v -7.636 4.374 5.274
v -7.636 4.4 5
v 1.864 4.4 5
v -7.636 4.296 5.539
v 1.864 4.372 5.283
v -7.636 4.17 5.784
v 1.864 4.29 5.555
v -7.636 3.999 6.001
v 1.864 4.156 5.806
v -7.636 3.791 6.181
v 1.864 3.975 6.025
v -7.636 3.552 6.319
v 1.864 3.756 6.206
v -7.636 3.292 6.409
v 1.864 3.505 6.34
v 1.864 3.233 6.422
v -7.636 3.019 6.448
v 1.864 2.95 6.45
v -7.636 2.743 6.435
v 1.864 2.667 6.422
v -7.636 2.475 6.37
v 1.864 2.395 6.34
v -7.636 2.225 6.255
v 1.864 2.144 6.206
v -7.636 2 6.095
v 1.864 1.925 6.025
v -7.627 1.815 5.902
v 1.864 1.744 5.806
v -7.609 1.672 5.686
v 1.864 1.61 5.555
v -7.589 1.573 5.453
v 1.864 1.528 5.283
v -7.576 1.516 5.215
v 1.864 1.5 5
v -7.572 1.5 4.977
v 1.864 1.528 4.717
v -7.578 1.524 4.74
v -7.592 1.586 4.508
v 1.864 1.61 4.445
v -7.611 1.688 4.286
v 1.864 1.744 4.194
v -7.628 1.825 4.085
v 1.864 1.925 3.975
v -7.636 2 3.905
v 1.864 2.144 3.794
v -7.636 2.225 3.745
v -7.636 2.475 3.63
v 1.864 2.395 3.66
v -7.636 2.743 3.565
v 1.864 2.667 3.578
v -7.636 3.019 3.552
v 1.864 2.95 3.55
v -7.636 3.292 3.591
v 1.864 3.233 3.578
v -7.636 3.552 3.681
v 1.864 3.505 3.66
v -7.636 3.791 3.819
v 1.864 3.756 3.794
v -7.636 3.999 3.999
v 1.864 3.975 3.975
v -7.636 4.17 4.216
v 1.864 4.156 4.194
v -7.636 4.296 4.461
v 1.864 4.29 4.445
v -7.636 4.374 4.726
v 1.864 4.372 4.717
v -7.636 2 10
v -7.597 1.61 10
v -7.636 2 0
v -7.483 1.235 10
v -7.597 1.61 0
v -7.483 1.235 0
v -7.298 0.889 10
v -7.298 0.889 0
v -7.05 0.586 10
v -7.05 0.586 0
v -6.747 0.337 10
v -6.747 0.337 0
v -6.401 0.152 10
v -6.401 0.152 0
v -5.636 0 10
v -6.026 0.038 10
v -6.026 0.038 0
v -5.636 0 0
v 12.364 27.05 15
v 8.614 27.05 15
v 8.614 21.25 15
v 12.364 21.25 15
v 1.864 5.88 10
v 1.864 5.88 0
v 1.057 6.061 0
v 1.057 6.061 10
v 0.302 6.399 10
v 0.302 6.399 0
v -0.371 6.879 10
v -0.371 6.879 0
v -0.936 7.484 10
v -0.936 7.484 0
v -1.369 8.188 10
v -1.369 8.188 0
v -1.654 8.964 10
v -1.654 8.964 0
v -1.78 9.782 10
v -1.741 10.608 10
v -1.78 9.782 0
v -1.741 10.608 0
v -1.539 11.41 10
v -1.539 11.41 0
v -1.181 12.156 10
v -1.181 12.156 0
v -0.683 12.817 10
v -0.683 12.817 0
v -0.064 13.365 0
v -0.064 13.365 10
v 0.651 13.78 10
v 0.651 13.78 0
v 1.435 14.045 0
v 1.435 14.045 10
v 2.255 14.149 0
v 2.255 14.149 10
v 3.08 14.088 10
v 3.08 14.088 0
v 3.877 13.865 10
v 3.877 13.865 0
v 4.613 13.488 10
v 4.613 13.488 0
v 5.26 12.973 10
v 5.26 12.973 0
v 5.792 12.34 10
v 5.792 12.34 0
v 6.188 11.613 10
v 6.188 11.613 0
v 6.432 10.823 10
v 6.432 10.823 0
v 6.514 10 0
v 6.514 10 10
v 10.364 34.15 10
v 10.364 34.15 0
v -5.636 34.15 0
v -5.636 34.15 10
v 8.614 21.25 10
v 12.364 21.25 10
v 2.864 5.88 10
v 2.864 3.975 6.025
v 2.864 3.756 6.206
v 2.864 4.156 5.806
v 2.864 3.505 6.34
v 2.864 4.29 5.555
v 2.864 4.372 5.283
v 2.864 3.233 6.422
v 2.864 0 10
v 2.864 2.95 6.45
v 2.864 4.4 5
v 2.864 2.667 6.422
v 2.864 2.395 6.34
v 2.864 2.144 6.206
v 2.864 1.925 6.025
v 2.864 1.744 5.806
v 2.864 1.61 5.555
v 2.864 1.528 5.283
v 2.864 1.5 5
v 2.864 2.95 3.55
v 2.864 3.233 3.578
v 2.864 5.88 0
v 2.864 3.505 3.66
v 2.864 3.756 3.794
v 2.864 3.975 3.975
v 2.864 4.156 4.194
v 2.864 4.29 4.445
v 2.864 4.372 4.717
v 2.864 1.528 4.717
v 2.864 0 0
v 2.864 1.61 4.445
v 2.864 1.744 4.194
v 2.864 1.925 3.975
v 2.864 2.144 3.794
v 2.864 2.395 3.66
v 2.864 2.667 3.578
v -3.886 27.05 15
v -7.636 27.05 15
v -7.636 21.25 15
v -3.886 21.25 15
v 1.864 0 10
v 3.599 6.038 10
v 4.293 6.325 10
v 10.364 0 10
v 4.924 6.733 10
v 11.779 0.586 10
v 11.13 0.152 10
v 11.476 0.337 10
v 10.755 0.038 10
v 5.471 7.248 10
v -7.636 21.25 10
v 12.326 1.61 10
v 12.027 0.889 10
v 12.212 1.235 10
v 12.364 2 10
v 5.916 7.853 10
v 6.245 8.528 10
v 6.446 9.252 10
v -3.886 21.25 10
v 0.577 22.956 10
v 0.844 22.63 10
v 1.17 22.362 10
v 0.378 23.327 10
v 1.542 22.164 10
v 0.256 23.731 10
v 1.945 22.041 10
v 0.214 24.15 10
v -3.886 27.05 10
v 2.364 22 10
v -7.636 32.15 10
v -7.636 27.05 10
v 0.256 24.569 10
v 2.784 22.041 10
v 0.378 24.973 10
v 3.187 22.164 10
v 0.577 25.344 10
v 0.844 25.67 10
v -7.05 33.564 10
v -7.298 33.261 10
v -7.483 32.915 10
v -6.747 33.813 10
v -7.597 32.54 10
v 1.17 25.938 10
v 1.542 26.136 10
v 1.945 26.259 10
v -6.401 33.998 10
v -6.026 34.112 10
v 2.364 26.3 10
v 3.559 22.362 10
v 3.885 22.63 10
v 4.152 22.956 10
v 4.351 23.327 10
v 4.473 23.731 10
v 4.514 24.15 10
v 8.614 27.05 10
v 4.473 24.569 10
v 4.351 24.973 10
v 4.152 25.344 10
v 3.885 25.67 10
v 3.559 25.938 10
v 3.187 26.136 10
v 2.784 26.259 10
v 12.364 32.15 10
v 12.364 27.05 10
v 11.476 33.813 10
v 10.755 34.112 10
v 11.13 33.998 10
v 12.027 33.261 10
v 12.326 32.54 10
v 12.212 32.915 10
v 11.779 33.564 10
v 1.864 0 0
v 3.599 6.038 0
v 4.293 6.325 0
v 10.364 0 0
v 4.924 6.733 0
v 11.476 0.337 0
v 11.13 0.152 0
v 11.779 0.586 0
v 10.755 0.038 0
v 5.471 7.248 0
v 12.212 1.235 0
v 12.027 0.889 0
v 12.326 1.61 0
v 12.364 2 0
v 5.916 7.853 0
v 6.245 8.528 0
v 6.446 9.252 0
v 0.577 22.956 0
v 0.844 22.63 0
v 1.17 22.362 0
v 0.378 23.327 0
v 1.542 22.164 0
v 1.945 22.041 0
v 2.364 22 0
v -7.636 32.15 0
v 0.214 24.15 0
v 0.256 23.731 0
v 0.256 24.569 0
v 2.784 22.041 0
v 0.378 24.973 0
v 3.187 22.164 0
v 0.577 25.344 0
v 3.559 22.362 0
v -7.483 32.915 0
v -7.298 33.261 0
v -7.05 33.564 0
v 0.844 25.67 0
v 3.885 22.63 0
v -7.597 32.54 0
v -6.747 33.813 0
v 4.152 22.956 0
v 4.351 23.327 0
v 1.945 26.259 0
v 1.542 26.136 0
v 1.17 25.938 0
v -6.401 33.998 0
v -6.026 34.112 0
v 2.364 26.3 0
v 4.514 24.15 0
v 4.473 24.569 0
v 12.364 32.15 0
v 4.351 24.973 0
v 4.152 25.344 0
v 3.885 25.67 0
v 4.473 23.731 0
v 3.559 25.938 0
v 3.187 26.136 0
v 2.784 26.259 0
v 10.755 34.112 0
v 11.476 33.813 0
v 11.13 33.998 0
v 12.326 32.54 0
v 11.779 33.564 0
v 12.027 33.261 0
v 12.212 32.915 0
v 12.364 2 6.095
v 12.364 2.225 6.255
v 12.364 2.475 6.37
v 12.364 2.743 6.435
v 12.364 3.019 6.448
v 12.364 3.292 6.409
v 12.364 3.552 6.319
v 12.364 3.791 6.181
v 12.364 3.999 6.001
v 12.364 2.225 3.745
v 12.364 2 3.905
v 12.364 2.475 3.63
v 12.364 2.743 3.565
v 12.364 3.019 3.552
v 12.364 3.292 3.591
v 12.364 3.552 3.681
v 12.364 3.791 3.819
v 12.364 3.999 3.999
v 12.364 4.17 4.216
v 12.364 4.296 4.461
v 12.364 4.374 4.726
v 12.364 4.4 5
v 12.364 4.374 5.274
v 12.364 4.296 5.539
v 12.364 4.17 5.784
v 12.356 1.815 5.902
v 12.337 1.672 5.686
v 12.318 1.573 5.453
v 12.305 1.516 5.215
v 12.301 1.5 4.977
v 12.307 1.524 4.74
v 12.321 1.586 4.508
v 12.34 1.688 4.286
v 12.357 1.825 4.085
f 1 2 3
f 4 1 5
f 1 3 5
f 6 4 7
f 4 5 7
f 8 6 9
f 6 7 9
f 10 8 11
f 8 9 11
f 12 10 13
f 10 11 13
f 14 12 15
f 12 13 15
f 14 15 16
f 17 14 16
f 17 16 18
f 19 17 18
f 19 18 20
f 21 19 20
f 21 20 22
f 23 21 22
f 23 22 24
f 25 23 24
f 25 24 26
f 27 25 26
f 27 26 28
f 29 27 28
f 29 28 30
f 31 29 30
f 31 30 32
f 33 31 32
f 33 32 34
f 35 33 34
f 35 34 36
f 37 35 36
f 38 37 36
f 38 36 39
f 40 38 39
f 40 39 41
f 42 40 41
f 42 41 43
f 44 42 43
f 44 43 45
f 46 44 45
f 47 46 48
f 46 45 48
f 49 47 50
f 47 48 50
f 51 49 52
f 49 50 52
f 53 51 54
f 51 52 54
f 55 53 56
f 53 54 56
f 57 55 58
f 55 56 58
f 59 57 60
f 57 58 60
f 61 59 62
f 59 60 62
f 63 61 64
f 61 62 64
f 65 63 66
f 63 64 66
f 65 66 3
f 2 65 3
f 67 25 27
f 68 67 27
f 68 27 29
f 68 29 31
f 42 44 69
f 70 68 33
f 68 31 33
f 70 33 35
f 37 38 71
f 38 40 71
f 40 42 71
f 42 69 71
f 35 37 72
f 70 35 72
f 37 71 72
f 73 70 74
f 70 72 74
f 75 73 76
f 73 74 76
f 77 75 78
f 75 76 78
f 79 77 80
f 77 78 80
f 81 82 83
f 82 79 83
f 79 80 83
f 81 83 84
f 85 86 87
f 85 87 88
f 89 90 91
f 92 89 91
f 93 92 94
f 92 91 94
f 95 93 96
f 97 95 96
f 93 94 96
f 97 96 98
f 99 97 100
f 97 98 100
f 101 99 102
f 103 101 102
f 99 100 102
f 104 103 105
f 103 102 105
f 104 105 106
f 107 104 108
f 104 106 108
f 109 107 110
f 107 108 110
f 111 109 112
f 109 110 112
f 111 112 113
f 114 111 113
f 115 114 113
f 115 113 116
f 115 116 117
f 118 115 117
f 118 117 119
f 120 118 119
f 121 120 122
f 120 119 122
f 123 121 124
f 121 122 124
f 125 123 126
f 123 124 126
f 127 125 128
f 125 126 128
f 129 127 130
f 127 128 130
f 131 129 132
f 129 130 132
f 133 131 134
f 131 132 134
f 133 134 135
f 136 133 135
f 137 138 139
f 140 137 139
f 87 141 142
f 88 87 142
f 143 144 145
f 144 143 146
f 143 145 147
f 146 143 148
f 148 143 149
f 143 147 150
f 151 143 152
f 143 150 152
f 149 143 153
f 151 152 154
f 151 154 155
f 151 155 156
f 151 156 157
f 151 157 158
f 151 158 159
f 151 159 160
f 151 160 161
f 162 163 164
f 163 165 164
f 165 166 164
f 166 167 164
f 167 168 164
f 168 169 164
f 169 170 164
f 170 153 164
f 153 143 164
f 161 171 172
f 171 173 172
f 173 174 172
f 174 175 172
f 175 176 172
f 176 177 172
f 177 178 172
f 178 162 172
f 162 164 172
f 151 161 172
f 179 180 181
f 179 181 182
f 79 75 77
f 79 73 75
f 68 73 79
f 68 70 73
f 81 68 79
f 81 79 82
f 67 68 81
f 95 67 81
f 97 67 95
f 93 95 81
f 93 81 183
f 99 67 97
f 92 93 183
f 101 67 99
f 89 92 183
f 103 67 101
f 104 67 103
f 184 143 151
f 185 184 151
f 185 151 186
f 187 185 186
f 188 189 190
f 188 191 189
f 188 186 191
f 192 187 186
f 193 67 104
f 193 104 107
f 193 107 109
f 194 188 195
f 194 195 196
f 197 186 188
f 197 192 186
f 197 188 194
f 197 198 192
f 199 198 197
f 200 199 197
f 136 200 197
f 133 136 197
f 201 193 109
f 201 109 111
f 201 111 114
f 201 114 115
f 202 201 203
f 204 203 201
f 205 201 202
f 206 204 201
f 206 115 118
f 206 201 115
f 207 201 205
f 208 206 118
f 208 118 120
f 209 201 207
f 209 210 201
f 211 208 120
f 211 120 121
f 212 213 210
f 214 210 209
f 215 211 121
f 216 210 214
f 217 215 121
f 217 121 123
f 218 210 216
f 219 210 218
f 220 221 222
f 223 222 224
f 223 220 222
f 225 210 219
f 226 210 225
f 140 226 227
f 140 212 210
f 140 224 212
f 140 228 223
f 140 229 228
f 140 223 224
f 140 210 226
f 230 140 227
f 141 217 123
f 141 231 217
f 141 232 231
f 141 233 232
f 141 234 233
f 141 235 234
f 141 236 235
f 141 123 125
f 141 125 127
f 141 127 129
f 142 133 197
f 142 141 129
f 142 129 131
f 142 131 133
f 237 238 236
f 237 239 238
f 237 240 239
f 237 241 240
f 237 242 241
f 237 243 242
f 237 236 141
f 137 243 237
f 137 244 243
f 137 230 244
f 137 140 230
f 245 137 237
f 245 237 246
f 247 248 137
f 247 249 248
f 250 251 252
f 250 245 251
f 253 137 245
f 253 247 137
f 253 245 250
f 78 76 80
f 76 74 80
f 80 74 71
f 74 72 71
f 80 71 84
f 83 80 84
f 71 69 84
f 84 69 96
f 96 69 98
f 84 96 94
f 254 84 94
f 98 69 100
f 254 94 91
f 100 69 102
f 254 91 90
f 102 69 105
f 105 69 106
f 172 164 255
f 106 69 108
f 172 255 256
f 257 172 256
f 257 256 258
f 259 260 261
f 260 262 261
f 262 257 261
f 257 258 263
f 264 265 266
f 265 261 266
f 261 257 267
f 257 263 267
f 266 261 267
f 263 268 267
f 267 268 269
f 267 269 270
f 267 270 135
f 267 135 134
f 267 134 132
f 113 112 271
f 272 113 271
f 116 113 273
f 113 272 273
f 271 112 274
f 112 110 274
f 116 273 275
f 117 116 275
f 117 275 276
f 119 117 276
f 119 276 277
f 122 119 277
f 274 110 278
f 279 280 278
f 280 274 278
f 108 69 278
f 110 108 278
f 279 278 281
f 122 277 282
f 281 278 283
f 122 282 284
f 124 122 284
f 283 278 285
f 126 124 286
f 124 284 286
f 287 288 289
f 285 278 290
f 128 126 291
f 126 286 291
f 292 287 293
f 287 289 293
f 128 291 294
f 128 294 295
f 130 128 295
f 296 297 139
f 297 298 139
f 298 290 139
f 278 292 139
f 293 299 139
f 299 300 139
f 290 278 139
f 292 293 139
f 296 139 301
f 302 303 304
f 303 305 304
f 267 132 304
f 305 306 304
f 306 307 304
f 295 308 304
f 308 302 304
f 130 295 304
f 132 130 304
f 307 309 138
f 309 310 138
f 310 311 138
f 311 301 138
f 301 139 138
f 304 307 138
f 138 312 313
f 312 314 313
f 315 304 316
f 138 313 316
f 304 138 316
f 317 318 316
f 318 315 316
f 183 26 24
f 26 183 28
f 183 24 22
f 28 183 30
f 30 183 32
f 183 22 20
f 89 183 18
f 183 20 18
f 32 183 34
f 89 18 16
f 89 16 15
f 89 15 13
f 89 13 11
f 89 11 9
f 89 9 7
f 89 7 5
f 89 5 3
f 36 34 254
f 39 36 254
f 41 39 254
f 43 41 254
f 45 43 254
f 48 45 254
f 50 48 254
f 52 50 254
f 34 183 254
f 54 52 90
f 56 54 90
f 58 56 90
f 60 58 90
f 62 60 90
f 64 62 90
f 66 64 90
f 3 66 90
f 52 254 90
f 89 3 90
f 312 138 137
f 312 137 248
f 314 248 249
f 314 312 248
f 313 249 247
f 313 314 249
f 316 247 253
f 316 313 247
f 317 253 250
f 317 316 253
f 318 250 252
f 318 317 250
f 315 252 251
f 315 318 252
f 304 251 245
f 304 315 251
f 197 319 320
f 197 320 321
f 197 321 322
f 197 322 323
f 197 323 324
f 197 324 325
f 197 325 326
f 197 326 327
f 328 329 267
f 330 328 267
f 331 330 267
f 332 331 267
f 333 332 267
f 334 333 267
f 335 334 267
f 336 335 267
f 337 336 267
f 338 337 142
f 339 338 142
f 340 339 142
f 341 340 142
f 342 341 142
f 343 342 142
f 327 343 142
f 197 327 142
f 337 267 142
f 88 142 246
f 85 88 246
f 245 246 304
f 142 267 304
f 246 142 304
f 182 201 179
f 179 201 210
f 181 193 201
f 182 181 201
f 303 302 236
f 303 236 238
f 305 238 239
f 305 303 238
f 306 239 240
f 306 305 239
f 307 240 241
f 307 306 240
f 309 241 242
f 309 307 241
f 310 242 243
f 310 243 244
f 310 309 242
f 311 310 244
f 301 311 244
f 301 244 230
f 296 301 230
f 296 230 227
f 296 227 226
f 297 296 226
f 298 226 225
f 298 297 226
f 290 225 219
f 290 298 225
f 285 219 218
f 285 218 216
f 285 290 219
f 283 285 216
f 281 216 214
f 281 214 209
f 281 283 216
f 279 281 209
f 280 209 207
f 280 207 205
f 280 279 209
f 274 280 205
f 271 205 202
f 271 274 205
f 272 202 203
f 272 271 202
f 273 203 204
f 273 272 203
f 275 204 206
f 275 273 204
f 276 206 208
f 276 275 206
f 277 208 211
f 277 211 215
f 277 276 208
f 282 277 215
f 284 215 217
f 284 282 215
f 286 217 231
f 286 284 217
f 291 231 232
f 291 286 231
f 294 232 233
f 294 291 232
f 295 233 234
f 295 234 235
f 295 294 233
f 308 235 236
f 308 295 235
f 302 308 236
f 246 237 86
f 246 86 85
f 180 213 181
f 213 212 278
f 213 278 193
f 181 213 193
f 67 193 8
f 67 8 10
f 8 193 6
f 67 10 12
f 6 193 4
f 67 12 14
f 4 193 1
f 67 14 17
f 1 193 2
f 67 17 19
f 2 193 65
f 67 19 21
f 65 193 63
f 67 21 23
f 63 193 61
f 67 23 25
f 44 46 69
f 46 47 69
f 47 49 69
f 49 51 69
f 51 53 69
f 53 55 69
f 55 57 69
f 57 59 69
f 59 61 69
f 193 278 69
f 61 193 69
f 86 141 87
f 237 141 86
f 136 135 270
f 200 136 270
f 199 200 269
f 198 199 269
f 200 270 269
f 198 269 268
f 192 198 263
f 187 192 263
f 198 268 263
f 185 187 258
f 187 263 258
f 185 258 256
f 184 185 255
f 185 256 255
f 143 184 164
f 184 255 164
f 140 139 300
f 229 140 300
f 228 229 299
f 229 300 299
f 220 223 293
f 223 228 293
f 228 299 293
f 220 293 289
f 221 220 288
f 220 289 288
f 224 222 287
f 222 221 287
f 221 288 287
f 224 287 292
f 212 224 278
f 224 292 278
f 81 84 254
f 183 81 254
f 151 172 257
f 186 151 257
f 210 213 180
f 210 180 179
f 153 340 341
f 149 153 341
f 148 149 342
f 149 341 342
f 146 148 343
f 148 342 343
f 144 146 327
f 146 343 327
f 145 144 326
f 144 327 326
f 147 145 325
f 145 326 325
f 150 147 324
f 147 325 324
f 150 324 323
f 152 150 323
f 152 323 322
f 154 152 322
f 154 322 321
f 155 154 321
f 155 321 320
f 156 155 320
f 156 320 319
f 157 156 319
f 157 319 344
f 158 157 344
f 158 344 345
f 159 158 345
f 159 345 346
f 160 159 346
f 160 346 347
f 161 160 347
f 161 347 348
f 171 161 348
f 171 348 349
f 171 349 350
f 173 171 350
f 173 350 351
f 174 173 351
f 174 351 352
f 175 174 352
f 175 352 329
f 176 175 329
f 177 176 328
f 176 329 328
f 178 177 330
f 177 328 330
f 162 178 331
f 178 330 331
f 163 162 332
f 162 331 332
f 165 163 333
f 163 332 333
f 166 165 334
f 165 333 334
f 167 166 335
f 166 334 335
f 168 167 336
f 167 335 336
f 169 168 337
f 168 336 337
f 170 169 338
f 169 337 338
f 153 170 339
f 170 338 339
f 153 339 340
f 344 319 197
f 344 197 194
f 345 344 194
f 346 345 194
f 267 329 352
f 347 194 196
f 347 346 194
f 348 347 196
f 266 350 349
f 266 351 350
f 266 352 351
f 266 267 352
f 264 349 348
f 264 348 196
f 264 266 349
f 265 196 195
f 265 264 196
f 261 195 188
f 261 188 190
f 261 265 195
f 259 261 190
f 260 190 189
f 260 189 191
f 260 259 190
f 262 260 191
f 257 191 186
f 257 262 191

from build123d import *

# Parameters (mm, degrees)
F0_R        = 2.15
F1_DEPTH    = 10
F2_W        = 3.75
F2_H        = 5.8
F3_DEPTH    = 5
F4_R        = 1.45
F5_DEPTH    = 25
F6_T1_DEPTH = 20


# Not quite as in the source:
# - a fillet or chamfer that OpenCascade refuses, or shapes differently, is made with other operations: its cross-section is extruded or revolved along the edge and cut away or added


with BuildPart() as f1:
    # F0 (on Top) → F1 (new body)
    with BuildSketch(Plane.XY):
        with BuildLine():
            Line((-7.6355537636, 34.15), (-7.6355537636, 0))
            Line((-7.6355537636, 0), (1.8644462364, 0))
            Line((1.8644462364, 0), (1.8644462364, 2.2661458509))
            ThreePointArc((1.8644462364, 2.2661458509), (-2.9359075253, 15.6540914389), (10.1144462364, 10))
            ThreePointArc((10.1144462364, 10), (8.0185376754, 4.6996462382), (2.8644462364, 2.2661458509))
            Line((2.8644462364, 2.2661458509), (2.8644462364, 0))
            Line((2.8644462364, 0), (12.3644462364, 0))
            Line((12.3644462364, 0), (12.3644462364, 34.15))
            Line((12.3644462364, 34.15), (-7.6355537636, 34.15))
        make_face()
        with Locations((2.3644462364, 24.15)):
            Circle(F0_R, mode=Mode.SUBTRACT)
        with BuildLine():
            ThreePointArc((10.1144462364, 10), (-2.9359075253, 15.6540914389), (1.8644462364, 2.2661458509))
            Line((1.8644462364, 2.2661458509), (1.8644462364, 5.880230589))
            ThreePointArc((1.8644462364, 5.880230589), (-0.387598458, 13.1062437123), (6.5144462364, 10))
            ThreePointArc((6.5144462364, 10), (5.4706899487, 7.2479553056), (2.8644462364, 5.880230589))
            Line((2.8644462364, 5.880230589), (2.8644462364, 2.2661458509))
            ThreePointArc((2.8644462364, 2.2661458509), (8.0185376754, 4.6996462382), (10.1144462364, 10))
        make_face()
    extrude(amount=F1_DEPTH)

    # F2 (on face) → F3 (join)
    with BuildSketch(Plane.XY.offset(10)):
        with Locations((-5.7605537636, 24.15)):
            Rectangle(F2_W, F2_H)
        with Locations((10.4894462364, 24.15)):
            Rectangle(F2_W, F2_H)
    extrude(amount=F3_DEPTH)

    # F4 (on face) → F5 (cut)
    with BuildSketch(Plane.YZ.offset(12.3644462364)):
        with Locations((2.95, 5)):
            Circle(F4_R)
    extrude(amount=-F5_DEPTH, mode=Mode.SUBTRACT)

    # F6: fillet of radius 2 on 4 edges, made by hand

    # F6_s2 → F6_t1 (cut)
    with BuildSketch(Plane.XY.offset(-5)):
        with BuildLine():
            ThreePointArc((12.3644462364, 2), (11.7786597988, 0.5857864376), (10.3644462364, 0))
            Line((10.3644462364, 0), (12.3644462364, 0))
            Line((12.3644462364, 0), (12.3644462364, 2))
        make_face()
        with BuildLine():
            ThreePointArc((-7.6355537636, 2), (-7.0497673259, 0.5857864376), (-5.6355537636, 0))
            Line((-5.6355537636, 0), (-7.6355537636, 0))
            Line((-7.6355537636, 0), (-7.6355537636, 2))
        make_face()
        with BuildLine():
            ThreePointArc((10.3644462364, 34.15), (11.7786597988, 33.5642135624), (12.3644462364, 32.15))
            Line((12.3644462364, 32.15), (12.3644462364, 34.15))
            Line((12.3644462364, 34.15), (10.3644462364, 34.15))
        make_face()
        with BuildLine():
            ThreePointArc((-5.6355537636, 34.15), (-7.0497673259, 33.5642135624), (-7.6355537636, 32.15))
            Line((-7.6355537636, 32.15), (-7.6355537636, 34.15))
            Line((-7.6355537636, 34.15), (-5.6355537636, 34.15))
        make_face()
    extrude(amount=F6_T1_DEPTH, mode=Mode.SUBTRACT)


solid = f1.part
